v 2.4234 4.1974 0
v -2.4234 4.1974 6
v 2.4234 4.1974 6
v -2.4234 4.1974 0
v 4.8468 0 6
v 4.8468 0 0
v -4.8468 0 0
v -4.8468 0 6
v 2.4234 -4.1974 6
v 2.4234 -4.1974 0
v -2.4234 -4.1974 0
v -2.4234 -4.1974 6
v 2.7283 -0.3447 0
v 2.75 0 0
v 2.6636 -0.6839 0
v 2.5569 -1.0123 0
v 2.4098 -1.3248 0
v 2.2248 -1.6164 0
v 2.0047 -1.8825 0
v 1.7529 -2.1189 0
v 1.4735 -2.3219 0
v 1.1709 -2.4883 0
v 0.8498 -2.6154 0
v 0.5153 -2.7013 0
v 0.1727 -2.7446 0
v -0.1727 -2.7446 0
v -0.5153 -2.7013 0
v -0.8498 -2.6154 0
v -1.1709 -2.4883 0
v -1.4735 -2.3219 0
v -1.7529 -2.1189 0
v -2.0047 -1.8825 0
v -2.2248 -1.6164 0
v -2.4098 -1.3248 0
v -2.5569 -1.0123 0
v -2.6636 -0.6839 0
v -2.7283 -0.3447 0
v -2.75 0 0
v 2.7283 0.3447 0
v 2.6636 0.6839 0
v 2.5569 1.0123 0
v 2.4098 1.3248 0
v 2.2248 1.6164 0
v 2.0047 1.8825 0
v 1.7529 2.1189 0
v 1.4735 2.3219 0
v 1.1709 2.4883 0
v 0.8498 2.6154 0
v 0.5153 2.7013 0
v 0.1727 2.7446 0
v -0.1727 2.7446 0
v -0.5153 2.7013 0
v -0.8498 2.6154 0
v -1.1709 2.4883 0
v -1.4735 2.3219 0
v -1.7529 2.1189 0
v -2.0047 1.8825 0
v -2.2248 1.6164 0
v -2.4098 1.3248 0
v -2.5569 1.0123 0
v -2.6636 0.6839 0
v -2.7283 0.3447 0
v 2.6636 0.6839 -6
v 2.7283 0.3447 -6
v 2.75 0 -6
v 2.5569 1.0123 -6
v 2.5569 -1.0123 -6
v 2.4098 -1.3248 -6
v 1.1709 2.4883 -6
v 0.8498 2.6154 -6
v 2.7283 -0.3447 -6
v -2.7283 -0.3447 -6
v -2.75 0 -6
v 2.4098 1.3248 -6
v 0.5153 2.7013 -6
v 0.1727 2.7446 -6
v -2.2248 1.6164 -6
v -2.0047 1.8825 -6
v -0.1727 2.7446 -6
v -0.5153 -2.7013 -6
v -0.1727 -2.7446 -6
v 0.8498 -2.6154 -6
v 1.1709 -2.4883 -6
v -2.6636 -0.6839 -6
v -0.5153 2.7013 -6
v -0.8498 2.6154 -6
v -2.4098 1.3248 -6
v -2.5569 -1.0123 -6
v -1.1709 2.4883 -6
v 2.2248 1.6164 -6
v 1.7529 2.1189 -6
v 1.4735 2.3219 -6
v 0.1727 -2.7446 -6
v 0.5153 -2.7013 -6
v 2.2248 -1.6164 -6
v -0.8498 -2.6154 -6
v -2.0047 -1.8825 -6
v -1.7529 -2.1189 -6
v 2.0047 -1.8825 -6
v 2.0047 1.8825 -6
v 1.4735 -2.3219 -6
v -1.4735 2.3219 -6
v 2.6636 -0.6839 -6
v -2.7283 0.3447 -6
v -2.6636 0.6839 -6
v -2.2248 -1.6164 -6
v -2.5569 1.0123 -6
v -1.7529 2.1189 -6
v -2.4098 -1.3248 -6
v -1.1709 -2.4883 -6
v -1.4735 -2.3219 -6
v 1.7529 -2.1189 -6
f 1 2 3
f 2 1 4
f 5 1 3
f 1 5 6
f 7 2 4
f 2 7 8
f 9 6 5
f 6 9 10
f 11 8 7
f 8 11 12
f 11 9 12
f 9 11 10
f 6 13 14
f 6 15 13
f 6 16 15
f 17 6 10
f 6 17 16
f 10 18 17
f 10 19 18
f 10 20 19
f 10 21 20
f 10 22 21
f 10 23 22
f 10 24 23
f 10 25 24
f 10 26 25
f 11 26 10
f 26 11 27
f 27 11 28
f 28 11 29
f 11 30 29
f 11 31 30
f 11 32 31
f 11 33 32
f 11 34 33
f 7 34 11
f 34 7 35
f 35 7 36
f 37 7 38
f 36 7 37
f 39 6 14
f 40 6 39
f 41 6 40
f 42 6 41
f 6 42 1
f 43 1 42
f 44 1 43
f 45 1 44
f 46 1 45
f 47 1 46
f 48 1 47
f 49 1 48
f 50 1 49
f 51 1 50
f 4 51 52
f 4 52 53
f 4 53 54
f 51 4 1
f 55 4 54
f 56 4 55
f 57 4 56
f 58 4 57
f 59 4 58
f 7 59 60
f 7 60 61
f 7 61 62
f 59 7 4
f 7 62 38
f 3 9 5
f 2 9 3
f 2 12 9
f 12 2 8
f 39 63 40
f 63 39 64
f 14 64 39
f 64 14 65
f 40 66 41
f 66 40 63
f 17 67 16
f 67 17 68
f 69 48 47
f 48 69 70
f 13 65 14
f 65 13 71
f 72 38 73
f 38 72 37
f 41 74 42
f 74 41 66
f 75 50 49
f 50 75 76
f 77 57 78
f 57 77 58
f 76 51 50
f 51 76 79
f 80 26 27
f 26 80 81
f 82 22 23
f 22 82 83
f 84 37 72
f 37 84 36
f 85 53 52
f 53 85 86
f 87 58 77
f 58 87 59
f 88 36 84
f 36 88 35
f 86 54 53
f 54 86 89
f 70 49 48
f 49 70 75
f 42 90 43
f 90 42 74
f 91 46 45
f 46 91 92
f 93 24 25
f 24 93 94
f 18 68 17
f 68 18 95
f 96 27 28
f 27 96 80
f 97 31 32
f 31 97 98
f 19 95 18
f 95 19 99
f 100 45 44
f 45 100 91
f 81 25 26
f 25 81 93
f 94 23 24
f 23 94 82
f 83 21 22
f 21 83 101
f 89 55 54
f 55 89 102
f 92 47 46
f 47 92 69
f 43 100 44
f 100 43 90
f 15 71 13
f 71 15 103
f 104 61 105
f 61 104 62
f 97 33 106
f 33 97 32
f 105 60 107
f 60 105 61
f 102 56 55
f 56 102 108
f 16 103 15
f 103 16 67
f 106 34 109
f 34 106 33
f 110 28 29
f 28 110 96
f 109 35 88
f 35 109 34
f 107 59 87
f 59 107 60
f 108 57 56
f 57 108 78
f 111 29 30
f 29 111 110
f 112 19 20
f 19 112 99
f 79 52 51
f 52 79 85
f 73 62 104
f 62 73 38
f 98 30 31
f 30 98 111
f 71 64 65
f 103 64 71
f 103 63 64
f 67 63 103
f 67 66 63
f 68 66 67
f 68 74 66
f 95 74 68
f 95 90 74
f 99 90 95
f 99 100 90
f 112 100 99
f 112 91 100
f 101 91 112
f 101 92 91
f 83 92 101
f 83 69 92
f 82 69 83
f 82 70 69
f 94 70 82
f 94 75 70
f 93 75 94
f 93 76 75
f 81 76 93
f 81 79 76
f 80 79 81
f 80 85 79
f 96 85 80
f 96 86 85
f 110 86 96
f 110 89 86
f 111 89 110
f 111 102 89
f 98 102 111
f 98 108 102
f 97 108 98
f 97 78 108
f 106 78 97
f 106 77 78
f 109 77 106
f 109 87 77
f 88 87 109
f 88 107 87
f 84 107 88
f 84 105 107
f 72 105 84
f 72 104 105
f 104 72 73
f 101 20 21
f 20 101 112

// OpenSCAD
$fn = 50;


difference() {
	union() {
		linear_extrude(height = 6) {
			polygon(points = [[4.8468000000, 0.0000000000], [2.4234000000, 4.1974519271], [-2.4234000000, 4.1974519271], [-4.8468000000, 0.0000000000], [-2.4234000000, -4.1974519271], [2.4234000000, -4.1974519271]]);
		}
		translate(v = [0, 0, -6]) {
			cylinder(h = 6, r = 2.7500000000);
		}
	}
	union();
}
